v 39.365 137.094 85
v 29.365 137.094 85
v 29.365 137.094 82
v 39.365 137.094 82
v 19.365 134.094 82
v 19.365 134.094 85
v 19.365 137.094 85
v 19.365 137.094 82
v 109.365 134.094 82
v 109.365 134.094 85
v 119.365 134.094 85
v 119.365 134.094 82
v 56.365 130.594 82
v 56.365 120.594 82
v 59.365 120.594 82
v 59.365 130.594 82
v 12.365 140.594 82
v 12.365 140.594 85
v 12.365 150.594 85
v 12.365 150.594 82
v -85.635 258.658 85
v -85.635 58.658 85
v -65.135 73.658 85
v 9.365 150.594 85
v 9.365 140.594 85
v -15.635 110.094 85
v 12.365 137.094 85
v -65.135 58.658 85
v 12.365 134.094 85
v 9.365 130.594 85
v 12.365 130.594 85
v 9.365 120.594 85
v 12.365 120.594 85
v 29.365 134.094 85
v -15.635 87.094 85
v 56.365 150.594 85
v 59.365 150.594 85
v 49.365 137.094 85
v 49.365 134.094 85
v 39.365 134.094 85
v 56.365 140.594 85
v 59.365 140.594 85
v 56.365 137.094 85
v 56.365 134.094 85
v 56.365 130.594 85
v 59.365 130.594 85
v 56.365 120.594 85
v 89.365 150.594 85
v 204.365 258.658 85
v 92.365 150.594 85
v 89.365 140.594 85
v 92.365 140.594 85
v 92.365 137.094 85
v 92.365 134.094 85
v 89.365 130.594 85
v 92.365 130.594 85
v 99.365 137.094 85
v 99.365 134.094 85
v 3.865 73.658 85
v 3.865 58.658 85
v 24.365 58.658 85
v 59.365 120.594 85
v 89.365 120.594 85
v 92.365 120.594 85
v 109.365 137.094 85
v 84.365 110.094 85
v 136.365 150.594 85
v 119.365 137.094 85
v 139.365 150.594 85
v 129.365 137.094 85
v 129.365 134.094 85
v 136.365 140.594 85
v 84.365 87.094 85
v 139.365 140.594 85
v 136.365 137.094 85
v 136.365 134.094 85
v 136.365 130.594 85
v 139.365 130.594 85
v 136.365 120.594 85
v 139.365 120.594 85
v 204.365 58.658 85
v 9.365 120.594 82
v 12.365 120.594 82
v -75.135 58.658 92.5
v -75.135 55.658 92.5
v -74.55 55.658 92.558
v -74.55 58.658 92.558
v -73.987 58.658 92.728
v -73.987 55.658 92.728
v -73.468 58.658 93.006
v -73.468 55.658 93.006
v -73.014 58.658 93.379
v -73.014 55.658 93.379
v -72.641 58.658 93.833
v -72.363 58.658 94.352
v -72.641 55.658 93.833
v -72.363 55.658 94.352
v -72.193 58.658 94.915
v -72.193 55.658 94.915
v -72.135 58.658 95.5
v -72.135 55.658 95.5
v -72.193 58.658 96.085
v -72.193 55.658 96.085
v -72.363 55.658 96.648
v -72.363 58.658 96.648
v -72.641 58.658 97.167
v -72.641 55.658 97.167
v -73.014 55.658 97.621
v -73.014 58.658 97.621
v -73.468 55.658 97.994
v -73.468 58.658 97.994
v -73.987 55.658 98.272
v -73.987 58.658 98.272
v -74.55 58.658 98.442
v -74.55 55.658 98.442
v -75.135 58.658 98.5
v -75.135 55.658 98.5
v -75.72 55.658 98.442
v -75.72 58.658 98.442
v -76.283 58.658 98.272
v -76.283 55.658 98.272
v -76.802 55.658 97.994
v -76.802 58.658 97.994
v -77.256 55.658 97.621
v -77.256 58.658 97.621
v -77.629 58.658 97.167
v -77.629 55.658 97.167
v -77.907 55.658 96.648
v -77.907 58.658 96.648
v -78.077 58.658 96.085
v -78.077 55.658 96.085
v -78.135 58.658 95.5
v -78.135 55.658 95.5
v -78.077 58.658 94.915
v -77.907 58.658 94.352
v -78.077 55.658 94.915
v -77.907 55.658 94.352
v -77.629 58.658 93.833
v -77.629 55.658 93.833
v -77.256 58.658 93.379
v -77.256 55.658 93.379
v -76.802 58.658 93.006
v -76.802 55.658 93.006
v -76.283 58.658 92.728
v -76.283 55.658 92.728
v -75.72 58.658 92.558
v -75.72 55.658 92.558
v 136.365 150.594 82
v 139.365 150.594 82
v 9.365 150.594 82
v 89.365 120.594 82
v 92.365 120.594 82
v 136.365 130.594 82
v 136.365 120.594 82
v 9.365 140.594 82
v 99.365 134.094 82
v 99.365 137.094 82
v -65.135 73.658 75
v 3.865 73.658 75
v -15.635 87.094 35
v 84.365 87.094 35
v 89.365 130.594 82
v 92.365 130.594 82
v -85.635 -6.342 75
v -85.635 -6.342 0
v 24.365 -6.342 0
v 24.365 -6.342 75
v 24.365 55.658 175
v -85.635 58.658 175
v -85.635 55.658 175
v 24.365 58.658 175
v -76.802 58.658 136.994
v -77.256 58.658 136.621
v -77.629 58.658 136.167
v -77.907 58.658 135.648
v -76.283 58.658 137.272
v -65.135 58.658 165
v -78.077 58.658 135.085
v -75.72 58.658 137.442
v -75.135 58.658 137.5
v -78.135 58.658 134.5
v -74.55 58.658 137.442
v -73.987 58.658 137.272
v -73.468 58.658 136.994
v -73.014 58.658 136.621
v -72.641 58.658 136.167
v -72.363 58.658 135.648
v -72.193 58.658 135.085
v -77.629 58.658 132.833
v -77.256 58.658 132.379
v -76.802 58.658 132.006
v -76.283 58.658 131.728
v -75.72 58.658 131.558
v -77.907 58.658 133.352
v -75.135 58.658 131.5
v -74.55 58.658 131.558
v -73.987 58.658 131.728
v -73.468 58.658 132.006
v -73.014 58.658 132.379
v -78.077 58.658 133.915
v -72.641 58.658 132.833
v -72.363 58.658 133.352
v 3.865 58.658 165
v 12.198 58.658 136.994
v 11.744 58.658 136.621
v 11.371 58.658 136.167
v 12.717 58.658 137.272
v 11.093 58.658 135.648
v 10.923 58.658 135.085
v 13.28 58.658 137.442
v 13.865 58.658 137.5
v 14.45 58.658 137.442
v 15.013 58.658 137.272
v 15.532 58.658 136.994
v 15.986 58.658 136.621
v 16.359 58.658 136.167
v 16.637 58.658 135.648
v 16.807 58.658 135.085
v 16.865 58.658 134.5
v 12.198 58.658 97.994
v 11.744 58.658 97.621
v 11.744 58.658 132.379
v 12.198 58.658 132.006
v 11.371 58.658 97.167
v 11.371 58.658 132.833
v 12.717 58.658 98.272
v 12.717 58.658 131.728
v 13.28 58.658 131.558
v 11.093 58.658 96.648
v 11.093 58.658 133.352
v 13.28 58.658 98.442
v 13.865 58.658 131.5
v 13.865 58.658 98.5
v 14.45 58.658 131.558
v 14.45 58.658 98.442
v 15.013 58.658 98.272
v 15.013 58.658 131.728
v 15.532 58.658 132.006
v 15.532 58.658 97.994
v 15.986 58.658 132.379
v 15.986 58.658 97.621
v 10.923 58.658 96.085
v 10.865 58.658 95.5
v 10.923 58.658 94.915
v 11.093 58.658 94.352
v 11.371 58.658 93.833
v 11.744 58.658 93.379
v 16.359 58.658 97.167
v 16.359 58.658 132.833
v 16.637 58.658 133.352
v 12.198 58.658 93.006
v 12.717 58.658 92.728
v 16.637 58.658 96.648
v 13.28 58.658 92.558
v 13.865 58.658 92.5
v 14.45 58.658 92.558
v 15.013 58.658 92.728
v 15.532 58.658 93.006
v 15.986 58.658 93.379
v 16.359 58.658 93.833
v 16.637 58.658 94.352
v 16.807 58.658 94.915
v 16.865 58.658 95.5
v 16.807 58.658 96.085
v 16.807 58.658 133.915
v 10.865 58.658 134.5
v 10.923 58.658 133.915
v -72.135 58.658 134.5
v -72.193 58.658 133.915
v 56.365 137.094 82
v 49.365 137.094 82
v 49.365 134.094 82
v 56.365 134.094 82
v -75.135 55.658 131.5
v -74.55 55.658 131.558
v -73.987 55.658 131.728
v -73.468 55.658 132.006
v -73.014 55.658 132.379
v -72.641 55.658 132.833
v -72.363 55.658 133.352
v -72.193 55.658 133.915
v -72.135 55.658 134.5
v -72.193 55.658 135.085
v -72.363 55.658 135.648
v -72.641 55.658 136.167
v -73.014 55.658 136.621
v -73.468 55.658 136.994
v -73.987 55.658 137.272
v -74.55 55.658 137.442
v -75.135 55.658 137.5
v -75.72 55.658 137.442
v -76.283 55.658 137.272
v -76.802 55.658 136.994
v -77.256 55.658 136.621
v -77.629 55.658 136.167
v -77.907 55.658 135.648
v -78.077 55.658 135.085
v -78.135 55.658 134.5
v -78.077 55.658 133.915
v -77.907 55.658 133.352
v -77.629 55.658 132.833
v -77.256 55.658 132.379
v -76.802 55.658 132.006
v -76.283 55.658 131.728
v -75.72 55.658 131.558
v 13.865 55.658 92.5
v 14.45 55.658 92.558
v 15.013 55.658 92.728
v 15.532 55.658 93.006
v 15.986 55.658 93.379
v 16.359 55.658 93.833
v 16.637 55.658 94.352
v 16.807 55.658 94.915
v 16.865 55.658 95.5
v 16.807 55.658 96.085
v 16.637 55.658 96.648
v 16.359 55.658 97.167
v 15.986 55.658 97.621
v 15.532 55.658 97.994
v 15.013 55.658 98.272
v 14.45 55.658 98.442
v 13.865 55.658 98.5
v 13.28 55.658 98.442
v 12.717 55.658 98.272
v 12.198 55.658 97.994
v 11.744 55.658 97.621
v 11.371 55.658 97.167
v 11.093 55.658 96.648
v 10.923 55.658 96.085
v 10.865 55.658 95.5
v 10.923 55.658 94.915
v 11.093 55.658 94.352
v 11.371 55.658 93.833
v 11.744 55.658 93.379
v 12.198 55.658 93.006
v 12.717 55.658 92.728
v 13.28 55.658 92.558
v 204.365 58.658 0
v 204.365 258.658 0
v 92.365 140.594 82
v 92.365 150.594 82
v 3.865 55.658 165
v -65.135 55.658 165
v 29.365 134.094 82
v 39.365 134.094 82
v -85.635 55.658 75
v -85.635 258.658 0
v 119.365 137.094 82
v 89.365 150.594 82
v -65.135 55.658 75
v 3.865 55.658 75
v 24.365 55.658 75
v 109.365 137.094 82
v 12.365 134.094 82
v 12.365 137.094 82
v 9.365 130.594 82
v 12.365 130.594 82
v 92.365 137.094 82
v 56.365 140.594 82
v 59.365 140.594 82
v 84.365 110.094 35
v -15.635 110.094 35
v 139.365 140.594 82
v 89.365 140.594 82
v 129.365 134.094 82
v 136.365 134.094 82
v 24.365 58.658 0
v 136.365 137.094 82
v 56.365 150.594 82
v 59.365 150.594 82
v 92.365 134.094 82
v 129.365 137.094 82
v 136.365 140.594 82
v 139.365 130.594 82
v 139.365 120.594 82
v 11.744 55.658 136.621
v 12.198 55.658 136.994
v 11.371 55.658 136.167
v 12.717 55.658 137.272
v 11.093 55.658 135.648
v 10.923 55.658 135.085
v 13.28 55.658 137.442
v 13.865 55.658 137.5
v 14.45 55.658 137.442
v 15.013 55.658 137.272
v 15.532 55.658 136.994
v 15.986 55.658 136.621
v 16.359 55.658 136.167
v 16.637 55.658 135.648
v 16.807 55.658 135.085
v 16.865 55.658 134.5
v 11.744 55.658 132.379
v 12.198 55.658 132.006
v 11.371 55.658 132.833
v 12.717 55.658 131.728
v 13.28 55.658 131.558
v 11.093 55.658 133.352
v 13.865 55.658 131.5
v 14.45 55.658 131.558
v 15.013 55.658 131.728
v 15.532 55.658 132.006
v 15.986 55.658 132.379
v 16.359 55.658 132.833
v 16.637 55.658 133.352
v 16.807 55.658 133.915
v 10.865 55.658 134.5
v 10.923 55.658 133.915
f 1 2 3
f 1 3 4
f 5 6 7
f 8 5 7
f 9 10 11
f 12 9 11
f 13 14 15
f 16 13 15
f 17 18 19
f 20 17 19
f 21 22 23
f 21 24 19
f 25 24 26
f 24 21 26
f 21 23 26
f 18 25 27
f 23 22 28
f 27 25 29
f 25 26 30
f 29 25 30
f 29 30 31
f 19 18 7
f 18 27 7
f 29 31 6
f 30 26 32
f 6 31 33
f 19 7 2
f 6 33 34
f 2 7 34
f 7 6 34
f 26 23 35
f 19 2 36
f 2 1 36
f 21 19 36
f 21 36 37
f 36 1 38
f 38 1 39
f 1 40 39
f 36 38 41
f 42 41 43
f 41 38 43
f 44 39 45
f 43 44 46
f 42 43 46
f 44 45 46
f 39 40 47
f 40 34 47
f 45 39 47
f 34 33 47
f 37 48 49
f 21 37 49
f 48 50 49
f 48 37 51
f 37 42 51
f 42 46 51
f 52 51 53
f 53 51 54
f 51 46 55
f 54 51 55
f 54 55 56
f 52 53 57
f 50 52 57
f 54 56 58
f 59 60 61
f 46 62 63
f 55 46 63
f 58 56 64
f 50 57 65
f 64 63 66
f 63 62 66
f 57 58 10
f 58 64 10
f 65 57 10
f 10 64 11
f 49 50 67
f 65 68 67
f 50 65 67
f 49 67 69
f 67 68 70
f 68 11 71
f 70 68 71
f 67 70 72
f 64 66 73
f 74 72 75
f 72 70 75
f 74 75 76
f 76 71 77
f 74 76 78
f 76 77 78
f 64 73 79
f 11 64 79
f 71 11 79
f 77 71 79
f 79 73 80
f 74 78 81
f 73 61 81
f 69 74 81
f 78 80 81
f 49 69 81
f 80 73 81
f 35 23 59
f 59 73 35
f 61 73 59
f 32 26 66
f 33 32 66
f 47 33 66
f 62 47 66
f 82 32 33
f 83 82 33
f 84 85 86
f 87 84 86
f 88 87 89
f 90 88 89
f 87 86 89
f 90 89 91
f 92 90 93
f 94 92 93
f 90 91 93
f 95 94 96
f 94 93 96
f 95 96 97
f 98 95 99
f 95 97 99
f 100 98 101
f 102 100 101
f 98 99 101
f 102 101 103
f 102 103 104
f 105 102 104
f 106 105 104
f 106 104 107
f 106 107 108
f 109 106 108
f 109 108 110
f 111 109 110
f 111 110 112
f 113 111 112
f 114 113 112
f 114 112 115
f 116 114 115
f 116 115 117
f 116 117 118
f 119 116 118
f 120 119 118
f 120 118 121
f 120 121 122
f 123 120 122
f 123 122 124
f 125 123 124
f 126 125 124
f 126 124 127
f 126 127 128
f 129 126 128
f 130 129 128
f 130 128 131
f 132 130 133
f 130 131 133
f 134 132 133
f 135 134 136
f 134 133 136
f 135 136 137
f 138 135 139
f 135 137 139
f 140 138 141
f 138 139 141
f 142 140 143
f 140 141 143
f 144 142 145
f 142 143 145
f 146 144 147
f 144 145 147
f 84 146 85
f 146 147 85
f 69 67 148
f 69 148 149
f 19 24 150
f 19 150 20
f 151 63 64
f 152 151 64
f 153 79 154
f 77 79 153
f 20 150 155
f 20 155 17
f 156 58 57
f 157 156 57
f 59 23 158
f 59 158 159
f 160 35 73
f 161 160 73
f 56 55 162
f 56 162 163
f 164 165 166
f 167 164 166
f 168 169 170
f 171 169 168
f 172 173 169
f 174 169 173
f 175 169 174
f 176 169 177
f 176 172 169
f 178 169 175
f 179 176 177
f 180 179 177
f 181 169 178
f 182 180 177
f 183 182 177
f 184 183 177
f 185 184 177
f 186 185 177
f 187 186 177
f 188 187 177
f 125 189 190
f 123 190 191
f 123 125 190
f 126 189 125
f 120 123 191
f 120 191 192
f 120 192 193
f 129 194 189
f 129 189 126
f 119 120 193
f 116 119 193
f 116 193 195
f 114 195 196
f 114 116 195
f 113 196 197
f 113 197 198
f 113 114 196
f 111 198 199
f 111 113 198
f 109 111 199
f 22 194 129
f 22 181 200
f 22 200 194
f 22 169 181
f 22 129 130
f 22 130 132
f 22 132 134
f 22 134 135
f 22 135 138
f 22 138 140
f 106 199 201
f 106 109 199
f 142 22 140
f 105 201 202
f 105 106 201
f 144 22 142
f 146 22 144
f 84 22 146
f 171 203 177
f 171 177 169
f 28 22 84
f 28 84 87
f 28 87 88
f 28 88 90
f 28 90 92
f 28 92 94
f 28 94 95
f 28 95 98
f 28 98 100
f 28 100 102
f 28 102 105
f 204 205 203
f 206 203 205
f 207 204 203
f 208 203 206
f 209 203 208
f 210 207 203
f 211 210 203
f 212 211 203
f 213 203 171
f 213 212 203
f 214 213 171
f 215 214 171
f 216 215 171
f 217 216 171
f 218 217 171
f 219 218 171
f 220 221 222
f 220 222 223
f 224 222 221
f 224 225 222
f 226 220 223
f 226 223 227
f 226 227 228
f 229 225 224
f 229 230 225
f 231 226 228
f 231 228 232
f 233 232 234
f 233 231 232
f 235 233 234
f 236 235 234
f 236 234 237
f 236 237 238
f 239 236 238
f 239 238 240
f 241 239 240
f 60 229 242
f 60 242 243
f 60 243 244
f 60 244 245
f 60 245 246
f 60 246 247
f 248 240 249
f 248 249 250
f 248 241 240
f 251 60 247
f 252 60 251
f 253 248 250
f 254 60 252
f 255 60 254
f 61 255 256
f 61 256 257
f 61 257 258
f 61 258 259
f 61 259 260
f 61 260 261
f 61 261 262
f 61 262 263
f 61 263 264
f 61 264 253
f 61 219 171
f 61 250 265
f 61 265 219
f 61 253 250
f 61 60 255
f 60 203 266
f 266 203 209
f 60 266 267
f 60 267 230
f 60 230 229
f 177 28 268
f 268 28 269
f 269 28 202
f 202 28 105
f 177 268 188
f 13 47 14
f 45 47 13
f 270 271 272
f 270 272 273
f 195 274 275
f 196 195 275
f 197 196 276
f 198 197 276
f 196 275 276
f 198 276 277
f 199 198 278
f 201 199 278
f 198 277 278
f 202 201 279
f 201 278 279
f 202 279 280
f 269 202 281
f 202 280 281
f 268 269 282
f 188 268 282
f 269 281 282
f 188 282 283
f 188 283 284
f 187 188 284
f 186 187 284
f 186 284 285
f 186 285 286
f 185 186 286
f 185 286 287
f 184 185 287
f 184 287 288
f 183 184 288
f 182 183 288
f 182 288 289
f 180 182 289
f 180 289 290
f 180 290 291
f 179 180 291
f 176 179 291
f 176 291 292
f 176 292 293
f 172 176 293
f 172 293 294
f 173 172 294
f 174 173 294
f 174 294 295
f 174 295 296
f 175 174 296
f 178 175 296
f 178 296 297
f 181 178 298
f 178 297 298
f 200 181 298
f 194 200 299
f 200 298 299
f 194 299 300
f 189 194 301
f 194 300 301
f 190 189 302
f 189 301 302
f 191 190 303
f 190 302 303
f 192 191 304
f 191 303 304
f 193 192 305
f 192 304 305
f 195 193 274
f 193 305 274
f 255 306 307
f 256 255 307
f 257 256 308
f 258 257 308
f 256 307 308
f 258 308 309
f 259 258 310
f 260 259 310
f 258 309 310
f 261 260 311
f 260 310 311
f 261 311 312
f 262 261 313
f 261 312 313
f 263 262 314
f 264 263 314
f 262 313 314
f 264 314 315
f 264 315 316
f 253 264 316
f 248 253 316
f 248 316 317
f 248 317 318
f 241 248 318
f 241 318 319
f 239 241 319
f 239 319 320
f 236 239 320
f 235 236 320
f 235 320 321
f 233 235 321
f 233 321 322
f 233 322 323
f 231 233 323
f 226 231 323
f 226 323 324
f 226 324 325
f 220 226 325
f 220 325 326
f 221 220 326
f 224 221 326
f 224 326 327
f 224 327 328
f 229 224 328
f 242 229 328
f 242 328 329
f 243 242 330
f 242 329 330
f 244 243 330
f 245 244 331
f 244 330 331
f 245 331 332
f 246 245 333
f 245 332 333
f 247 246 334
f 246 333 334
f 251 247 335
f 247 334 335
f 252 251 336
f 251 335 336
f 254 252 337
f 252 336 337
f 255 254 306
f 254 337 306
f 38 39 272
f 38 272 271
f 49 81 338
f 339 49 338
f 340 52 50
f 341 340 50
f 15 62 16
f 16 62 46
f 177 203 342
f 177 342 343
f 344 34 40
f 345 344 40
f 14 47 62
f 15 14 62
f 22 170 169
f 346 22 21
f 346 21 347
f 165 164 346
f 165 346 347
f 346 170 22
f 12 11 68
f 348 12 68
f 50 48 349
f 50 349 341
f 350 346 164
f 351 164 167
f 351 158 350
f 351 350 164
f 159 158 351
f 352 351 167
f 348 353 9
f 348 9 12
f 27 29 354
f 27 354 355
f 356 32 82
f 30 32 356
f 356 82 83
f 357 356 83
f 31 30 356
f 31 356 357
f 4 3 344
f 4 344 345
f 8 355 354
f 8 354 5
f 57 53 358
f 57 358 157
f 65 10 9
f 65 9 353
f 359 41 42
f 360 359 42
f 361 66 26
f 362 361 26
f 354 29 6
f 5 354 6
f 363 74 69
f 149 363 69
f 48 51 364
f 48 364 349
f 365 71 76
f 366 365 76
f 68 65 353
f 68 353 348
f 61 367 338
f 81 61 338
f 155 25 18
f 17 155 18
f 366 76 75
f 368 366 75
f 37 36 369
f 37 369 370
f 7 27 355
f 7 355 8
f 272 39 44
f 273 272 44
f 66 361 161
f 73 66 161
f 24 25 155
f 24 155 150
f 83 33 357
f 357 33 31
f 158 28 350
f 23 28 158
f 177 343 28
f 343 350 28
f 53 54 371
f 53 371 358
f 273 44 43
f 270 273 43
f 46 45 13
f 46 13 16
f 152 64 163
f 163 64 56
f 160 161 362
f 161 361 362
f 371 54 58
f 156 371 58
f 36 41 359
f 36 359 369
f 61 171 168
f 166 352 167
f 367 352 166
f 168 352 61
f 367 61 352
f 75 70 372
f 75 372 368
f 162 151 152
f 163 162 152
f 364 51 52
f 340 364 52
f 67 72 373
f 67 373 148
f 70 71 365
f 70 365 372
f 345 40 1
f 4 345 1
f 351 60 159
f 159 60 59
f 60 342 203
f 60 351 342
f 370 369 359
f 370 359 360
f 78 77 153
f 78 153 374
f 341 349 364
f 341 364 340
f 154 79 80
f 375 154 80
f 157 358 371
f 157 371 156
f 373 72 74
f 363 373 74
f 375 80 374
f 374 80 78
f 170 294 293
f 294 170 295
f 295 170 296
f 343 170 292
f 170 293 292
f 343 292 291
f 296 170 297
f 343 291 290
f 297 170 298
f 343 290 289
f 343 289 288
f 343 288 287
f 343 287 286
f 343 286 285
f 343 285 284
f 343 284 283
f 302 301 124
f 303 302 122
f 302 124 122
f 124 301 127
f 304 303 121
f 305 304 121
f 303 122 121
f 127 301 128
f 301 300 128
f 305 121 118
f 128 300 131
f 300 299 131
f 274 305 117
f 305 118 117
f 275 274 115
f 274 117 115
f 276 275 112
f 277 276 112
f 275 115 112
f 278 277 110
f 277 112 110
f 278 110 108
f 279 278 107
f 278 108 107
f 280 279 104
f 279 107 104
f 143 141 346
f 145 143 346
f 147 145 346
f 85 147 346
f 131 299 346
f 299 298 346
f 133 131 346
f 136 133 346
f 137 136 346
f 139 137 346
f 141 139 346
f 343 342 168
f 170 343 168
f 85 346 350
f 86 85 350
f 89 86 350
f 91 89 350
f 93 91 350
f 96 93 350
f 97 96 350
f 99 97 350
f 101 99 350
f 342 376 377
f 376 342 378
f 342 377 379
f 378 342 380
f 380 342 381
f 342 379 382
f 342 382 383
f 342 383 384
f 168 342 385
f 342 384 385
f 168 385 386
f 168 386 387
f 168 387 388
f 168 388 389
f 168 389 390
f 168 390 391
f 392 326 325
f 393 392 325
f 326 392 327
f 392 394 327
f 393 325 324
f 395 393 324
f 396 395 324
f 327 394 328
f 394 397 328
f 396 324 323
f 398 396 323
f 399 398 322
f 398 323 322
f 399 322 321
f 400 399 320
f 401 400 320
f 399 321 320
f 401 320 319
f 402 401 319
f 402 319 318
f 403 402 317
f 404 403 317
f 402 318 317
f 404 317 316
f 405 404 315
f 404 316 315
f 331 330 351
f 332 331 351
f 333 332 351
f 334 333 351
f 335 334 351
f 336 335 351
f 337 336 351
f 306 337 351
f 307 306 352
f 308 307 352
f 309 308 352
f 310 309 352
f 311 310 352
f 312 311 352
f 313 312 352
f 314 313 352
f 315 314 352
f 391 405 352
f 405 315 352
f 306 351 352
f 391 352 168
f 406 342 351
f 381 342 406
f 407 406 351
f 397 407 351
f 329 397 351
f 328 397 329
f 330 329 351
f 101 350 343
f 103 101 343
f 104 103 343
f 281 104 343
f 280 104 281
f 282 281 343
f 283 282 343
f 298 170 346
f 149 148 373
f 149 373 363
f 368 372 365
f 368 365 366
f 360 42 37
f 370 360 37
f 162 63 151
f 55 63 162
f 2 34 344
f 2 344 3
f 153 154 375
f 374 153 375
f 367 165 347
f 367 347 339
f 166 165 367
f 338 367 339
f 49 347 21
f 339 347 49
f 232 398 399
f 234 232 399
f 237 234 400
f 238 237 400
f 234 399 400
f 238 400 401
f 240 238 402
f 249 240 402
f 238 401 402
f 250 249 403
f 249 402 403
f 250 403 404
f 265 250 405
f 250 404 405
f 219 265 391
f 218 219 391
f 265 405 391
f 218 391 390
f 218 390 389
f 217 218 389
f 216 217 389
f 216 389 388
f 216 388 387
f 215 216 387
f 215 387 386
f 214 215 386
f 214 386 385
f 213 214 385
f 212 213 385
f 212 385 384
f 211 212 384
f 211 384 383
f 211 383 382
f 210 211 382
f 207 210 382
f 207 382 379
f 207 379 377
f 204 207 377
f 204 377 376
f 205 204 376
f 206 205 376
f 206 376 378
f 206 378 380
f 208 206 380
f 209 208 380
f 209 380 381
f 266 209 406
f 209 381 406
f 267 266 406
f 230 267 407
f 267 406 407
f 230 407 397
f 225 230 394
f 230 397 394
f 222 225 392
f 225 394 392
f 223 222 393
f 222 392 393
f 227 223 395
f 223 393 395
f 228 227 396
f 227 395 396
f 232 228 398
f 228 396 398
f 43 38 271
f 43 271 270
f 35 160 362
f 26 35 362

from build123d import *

# Parameters (mm, degrees)
CROQUIS1_W              = 110
CROQUIS1_H              = 65
SALIENTE_EXTRUIR1_DEPTH = 75
CROQUIS3_W              = 110
CROQUIS3_H              = 3
SALIENTE_EXTRUIR2_DEPTH = 70
CROQUIS4_R              = 3
CORTAR_EXTRUIR1_DEPTH   = 70
SALIENTE_EXTRUIR3_DEPTH = 3
CROQUIS7_W              = 290
CROQUIS7_H              = 85
SALIENTE_EXTRUIR4_DEPTH = 200
CROQUIS8_W              = 69
CROQUIS8_H              = 15
CORTAR_EXTRUIR2_DEPTH   = 10
CORTAR_EXTRUIR3_DEPTH   = 50
CROQUIS12_W             = 7
CROQUIS12_H             = 3
CROQUIS12_W_2           = 3
CROQUIS12_H_2           = 10
CROQUIS12_W_3           = 10
CORTAR_EXTRUIR4_DEPTH   = 3


with BuildPart() as part:
    # Croquis1 → Saliente-Extruir1 (new body)
    with BuildSketch(Plane.XY):
        with Locations((-30.634930344, 26.158405172)):
            Rectangle(CROQUIS1_W, CROQUIS1_H)
    extrude(amount=SALIENTE_EXTRUIR1_DEPTH)

    # Croquis3 → Saliente-Extruir2 (add)
    with BuildSketch(Plane.XY.offset(75)):
        with Locations((-30.634930344, 57.158405172)):
            Rectangle(CROQUIS3_W, CROQUIS3_H)
    extrude(amount=SALIENTE_EXTRUIR2_DEPTH)

    # Croquis4 → Cortar-Extruir1 (cut)
    with BuildSketch(Plane.XZ.offset(-55.658405172)):
        with Locations(Location((-75.134930344, 134.5, 0), (0, 0, 270))):
            Circle(CROQUIS4_R)
        with Locations(Location((-75.134930344, 95.5, 0), (0, 0, 270))):
            Circle(CROQUIS4_R)
        with Locations(Location((13.865069656, 134.5, 0), (0, 0, 270))):
            Circle(CROQUIS4_R)
        with Locations(Location((13.865069656, 95.5, 0), (0, 0, 270))):
            Circle(CROQUIS4_R)
        Polygon((-65.134930344, 134.5), (-65.134930344, 75), (3.865069656, 75), (3.865069656, 138), (3.865069656, 145), (-65.134930344, 145), align=None)
    extrude(amount=-CORTAR_EXTRUIR1_DEPTH, mode=Mode.SUBTRACT)

    # Croquis6 → Saliente-Extruir3 (add)
    with BuildSketch(Plane(origin=(0, 58.658405172, 0), x_dir=(1, 0, 0), z_dir=(0, 1, 0))):
        Polygon((-85.634930344, -145), (-85.634930344, -175), (24.365069656, -175), (24.365069656, -145), (3.865069656, -145), (3.865069656, -165), (-65.134930344, -165), (-65.134930344, -145), align=None)
    extrude(amount=-SALIENTE_EXTRUIR3_DEPTH)

    # Croquis7 → Saliente-Extruir4 (add)
    with BuildSketch(Plane(origin=(0, 58.658405172, 0), x_dir=(1, 0, 0), z_dir=(0, 1, 0))):
        with Locations((59.365069656, -42.5)):
            Rectangle(CROQUIS7_W, CROQUIS7_H)
    extrude(amount=SALIENTE_EXTRUIR4_DEPTH)

    # Croquis8 → Cortar-Extruir2 (cut)
    with BuildSketch(Plane.XY.offset(85)):
        with Locations((-30.634930344, 66.158405172)):
            Rectangle(CROQUIS8_W, CROQUIS8_H)
    extrude(amount=-CORTAR_EXTRUIR2_DEPTH, mode=Mode.SUBTRACT)

    # Croquis10 → Cortar-Extruir3 (cut)
    with BuildSketch(Plane.XY.offset(85)):
        Polygon((-0.634930344, 87.0941562), (-15.634930344, 87.0941562), (-15.634930344, 110.0941562), (-0.634930344, 110.0941562), (69.365069656, 110.0941562), (84.365069656, 110.0941562), (84.365069656, 87.0941562), (69.365069656, 87.0941562), align=None)
    extrude(amount=-CORTAR_EXTRUIR3_DEPTH, mode=Mode.SUBTRACT)

    # Croquis12 → Cortar-Extruir4 (cut)
    with BuildSketch(Plane.XY.offset(85)):
        with Locations((15.865069656, 135.5941562)):
            Rectangle(CROQUIS12_W, CROQUIS12_H)
        with Locations((10.865069656, 125.5941562)):
            Rectangle(CROQUIS12_W_2, CROQUIS12_H_2)
        with Locations((57.865069656, 145.5941562)):
            Rectangle(CROQUIS12_W_2, CROQUIS12_H_2)
        with Locations((57.865069656, 125.5941562)):
            Rectangle(CROQUIS12_W_2, CROQUIS12_H_2)
        with Locations((52.865069656, 135.5941562)):
            Rectangle(CROQUIS12_W, CROQUIS12_H)
        with Locations((10.865069656, 145.5941562)):
            Rectangle(CROQUIS12_W_2, CROQUIS12_H_2)
        with Locations((34.365069656, 135.5941562)):
            Rectangle(CROQUIS12_W_3, CROQUIS12_H)
        with Locations((114.365069656, 135.5941562)):
            Rectangle(CROQUIS12_W_3, CROQUIS12_H)
        with Locations((132.865069656, 135.5941562)):
            Rectangle(CROQUIS12_W, CROQUIS12_H)
        with Locations((90.865069656, 145.5941562)):
            Rectangle(CROQUIS12_W_2, CROQUIS12_H_2)
        with Locations((90.865069656, 125.5941562)):
            Rectangle(CROQUIS12_W_2, CROQUIS12_H_2)
        with Locations((95.865069656, 135.5941562)):
            Rectangle(CROQUIS12_W, CROQUIS12_H)
        with Locations((137.865069656, 145.5941562)):
            Rectangle(CROQUIS12_W_2, CROQUIS12_H_2)
        with Locations((137.865069656, 125.5941562)):
            Rectangle(CROQUIS12_W_2, CROQUIS12_H_2)
    extrude(amount=-CORTAR_EXTRUIR4_DEPTH, mode=Mode.SUBTRACT)


solid = part.part
